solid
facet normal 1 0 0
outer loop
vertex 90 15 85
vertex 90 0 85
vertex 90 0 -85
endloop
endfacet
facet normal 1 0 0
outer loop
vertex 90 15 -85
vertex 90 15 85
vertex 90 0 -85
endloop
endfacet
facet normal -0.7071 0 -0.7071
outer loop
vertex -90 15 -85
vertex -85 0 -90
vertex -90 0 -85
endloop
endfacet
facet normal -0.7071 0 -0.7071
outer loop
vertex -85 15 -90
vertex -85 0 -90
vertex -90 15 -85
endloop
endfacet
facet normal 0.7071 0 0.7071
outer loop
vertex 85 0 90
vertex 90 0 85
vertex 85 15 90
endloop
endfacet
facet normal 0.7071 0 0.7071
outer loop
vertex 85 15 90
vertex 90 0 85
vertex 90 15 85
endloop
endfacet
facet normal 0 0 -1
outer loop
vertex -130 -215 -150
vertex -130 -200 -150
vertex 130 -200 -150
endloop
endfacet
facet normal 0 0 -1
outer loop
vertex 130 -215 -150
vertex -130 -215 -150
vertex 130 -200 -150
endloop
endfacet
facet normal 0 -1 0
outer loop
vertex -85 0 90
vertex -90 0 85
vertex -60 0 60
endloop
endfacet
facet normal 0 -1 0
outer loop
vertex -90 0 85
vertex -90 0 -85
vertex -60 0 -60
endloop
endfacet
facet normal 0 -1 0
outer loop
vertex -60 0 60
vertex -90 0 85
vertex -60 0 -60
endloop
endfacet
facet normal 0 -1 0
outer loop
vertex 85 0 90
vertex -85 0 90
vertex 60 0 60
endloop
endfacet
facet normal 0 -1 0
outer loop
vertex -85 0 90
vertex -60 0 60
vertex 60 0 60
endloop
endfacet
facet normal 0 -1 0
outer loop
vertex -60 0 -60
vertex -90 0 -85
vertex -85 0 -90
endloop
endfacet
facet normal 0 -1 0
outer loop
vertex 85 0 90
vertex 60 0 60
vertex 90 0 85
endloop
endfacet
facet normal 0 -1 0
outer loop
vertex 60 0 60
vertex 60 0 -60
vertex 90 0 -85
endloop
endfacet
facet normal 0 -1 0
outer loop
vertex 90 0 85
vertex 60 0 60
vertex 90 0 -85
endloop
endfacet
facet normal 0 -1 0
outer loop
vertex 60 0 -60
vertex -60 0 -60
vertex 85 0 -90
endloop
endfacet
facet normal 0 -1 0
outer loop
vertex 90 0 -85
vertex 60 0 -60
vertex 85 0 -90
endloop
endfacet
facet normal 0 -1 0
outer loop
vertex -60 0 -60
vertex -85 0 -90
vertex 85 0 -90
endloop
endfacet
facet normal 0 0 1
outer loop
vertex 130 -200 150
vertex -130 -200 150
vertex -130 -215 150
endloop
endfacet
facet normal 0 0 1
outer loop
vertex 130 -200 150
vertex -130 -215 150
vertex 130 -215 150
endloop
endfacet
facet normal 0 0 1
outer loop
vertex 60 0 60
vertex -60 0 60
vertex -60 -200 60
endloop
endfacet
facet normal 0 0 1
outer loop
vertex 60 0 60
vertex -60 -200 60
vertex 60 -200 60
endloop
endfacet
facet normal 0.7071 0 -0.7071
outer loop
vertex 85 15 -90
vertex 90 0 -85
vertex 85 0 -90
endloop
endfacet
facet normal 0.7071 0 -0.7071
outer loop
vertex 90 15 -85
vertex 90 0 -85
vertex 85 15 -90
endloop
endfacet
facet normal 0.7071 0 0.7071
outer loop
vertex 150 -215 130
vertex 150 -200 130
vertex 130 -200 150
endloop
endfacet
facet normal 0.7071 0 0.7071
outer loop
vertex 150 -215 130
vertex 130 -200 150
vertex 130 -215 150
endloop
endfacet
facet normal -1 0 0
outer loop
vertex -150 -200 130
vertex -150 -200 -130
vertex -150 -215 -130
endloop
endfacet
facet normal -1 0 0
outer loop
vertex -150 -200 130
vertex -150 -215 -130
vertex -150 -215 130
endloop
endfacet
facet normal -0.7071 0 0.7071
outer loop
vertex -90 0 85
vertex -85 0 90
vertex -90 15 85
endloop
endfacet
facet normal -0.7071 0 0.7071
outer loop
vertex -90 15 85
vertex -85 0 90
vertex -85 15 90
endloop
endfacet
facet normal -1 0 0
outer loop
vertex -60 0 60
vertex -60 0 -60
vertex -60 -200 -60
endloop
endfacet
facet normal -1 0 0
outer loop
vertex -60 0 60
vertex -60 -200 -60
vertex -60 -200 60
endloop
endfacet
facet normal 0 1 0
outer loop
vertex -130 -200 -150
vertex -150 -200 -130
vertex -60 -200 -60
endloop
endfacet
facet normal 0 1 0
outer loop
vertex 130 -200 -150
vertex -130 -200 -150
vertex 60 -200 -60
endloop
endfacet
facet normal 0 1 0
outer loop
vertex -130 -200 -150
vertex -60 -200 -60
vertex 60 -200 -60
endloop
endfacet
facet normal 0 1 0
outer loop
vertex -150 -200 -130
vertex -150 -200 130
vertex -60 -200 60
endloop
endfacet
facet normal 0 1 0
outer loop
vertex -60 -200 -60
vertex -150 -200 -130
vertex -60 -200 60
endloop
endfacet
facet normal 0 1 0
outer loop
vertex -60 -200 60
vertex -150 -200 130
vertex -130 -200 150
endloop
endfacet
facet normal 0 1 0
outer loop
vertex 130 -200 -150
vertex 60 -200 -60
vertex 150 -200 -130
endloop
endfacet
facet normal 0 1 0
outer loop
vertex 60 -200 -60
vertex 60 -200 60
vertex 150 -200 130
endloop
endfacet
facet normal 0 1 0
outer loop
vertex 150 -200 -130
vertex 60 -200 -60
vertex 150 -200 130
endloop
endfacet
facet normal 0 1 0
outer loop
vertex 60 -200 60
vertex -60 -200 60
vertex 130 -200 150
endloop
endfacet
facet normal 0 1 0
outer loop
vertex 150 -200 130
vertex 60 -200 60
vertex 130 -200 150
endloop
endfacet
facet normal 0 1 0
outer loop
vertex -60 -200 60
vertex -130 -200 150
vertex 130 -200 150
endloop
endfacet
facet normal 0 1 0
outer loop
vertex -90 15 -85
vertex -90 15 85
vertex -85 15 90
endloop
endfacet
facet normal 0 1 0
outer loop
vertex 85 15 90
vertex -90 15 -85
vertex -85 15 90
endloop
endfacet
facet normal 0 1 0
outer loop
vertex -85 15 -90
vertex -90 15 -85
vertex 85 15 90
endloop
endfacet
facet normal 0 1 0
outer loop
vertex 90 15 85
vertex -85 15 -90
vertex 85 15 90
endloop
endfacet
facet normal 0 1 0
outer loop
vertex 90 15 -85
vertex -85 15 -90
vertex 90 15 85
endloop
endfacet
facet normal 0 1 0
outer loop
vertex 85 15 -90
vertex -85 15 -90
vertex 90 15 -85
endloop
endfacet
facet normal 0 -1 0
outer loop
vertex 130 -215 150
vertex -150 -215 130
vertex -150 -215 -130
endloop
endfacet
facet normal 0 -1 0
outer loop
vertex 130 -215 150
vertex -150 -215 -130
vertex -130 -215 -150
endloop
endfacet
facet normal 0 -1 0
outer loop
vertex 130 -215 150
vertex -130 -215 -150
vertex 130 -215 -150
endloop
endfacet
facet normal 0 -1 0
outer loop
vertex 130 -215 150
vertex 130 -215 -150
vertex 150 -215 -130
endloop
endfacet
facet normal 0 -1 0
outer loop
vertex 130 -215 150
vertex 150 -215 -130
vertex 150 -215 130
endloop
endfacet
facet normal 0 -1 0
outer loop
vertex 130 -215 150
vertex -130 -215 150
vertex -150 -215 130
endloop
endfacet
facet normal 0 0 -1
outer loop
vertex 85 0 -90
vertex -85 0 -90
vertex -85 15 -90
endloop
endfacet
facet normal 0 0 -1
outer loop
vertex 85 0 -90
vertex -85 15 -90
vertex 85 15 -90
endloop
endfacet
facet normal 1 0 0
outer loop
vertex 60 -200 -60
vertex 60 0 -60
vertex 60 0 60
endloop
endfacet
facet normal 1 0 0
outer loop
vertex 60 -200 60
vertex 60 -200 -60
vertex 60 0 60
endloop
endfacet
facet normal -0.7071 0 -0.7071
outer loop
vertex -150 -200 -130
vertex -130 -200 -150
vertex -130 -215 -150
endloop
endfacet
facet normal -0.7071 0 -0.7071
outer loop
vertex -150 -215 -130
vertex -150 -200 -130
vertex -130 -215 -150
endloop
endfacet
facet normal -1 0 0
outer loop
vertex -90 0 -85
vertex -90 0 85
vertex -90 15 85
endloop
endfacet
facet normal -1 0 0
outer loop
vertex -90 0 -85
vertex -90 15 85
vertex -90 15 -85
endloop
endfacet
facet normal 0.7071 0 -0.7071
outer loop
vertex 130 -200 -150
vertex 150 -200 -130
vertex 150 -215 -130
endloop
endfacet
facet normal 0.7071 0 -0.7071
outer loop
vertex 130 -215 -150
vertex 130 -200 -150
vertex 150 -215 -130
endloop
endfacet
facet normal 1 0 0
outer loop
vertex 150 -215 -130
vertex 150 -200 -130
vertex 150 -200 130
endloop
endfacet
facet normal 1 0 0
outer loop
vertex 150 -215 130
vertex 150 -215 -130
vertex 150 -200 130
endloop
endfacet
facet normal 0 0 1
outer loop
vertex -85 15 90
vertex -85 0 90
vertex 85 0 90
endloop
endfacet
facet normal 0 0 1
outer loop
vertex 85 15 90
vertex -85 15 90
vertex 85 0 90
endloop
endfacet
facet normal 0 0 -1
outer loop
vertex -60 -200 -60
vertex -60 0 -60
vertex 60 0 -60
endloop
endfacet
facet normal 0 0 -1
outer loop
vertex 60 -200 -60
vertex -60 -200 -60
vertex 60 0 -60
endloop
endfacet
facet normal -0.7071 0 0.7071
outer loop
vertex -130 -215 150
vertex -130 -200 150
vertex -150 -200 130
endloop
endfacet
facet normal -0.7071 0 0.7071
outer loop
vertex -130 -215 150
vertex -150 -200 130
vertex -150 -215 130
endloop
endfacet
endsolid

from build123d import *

# Parameters (mm, degrees)
SKETCH_1_W      = 180
SKETCH_1_H      = 180
EXTRUDE_1_DEPTH = 15
SKETCH_2_W      = 120
SKETCH_2_H      = 120
EXTRUDE_2_DEPTH = 200
SKETCH_3_W      = 300
SKETCH_3_H      = 300
EXTRUDE_3_DEPTH = 15
CHAMFER_1_SIZE  = 20
CHAMFER_2_SIZE  = 5


with BuildPart() as part:
    # 草图1 → 凸台-拉伸1 (new body)
    with BuildSketch(Plane(origin=(0, 0, 0), x_dir=(1, 0, 0), z_dir=(0, 1, 0))):
        Rectangle(SKETCH_1_W, SKETCH_1_H)
    extrude(amount=EXTRUDE_1_DEPTH)

    # 草图2 → 凸台-拉伸2 (add)
    with BuildSketch(Plane.XZ):
        Rectangle(SKETCH_2_W, SKETCH_2_H)
    extrude(amount=EXTRUDE_2_DEPTH)

    # 草图3 → 凸台-拉伸3 (add)
    with BuildSketch(Plane.XZ.offset(200)):
        Rectangle(SKETCH_3_W, SKETCH_3_H)
    extrude(amount=EXTRUDE_3_DEPTH)

    # 倒角1
    chamfer_1_edges = [part.edges().sort_by_distance(p)[0] for p in [
        (-150, -207.5, 150),
        (-150, -207.5, -150),
        (150, -207.5, -150),
        (150, -207.5, 150),
    ]]
    chamfer(chamfer_1_edges, length=CHAMFER_1_SIZE)

    # 倒角2
    chamfer_2_edges = [part.edges().sort_by_distance(p)[0] for p in [
        (-90, 7.5, -90),
        (90, 7.5, -90),
        (90, 7.5, 90),
        (-90, 7.5, 90),
    ]]
    chamfer(chamfer_2_edges, length=CHAMFER_2_SIZE)


solid = part.part
